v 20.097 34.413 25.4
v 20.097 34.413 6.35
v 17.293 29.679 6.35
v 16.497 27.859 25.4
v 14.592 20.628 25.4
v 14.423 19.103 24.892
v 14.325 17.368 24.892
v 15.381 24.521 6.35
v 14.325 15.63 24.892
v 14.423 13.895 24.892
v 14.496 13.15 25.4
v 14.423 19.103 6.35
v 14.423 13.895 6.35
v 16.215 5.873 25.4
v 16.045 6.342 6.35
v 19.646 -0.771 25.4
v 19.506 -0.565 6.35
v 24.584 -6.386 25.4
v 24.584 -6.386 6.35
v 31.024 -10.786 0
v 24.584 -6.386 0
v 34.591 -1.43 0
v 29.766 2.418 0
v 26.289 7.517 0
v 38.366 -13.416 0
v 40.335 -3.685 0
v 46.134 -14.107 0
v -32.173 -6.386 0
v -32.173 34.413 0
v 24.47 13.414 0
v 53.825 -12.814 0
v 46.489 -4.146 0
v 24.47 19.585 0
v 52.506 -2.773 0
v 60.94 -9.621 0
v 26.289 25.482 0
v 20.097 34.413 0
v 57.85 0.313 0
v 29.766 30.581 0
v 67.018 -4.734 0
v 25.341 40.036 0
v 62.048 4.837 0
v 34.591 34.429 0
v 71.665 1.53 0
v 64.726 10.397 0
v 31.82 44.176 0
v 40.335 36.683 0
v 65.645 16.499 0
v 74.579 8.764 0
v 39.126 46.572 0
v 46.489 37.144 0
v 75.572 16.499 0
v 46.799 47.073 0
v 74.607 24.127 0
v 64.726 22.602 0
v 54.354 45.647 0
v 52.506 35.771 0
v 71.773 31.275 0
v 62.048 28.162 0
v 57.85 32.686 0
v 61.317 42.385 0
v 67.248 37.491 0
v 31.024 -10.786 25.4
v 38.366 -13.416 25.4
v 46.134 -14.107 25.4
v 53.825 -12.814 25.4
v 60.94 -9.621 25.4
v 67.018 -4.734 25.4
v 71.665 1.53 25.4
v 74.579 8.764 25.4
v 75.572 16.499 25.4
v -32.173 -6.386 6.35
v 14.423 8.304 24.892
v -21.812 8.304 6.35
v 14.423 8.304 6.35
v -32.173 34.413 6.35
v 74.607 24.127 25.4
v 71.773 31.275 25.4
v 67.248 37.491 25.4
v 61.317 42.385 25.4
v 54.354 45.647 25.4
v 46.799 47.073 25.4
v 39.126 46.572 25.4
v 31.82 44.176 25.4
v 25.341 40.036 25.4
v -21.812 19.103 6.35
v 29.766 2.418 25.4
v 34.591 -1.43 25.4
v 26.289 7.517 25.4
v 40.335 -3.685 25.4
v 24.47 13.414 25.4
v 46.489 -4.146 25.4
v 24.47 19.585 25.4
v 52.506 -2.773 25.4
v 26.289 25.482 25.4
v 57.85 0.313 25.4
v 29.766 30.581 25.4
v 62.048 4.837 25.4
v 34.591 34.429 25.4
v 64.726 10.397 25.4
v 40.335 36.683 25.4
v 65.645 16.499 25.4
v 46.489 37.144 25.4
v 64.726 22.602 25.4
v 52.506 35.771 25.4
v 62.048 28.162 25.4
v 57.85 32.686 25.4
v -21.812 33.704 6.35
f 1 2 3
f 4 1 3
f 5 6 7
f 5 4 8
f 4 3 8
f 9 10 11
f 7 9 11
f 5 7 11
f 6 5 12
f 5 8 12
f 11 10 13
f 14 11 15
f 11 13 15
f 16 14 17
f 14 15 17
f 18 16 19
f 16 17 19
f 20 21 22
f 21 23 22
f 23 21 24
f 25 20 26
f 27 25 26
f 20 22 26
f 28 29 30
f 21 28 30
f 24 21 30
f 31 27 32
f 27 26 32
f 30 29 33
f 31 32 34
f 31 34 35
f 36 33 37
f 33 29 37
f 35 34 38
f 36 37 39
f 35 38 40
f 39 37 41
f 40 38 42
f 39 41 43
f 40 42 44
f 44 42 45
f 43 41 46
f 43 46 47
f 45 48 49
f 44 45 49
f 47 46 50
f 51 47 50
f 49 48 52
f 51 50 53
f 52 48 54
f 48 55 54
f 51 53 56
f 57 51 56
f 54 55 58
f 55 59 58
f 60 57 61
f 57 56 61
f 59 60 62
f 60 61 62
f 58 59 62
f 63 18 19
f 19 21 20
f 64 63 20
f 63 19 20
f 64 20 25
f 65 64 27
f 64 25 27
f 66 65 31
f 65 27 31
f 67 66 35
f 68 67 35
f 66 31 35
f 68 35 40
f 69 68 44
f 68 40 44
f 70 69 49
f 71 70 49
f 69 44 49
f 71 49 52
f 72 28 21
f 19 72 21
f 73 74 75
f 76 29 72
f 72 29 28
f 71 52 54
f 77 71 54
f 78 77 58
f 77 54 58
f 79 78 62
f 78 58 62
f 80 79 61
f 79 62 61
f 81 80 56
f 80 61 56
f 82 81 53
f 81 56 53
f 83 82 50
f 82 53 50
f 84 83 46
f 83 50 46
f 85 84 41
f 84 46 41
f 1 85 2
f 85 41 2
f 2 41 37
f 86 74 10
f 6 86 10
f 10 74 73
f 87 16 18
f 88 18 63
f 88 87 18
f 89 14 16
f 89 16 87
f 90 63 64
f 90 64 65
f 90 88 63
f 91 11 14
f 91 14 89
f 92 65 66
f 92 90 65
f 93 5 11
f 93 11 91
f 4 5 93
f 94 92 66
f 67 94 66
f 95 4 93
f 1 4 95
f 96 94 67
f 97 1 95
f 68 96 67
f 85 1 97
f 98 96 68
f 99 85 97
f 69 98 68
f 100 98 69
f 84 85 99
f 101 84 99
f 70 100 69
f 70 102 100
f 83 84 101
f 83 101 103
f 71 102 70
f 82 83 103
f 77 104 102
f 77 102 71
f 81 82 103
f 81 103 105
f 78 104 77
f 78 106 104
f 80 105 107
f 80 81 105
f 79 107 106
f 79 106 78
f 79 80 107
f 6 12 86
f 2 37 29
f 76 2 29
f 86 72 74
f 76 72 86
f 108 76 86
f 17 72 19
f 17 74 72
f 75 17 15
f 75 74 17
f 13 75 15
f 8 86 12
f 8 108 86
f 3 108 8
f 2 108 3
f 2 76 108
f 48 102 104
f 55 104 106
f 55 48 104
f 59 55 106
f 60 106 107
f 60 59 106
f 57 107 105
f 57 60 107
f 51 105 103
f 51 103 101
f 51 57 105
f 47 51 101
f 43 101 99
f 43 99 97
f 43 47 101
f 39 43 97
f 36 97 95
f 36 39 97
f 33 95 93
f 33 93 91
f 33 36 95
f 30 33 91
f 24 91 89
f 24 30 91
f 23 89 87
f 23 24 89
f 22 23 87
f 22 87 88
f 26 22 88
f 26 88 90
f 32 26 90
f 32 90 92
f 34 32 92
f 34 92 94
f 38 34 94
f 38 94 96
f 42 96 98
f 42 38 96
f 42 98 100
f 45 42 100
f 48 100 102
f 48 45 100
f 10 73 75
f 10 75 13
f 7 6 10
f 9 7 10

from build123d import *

# Parameters (mm, degrees)
F1_DEPTH = 6.35
F0_R     = 20.703057
F2_DEPTH = 25.4
F4_DEPTH = 18.542
F6_DEPTH = 25.4


with BuildPart() as f1:
    # F0 (on Top) → F1 (new body)
    with BuildSketch(Plane.XY):
        with BuildLine():
            ThreePointArc((24.584481, -6.386341), (14.495983, 13.150341), (20.096751, 34.412776))
            Line((20.096751, 34.412776), (-32.172695, 34.412776))
            Line((-32.172695, 34.412776), (-32.172695, -6.386341))
            Line((-32.172695, -6.386341), (24.584481, -6.386341))
        make_face()
    extrude(amount=F1_DEPTH)

    # F0 (on Top) → F2 (join)
    with BuildSketch(Plane.XY):
        with BuildLine():
            ThreePointArc((24.584481, -6.386341), (57.484915, -11.444852), (75.572235, 16.499306))
            ThreePointArc((75.572235, 16.499306), (54.354409, 45.647298), (20.096751, 34.412776))
            ThreePointArc((20.096751, 34.412776), (14.495983, 13.150341), (24.584481, -6.386341))
        make_face()
        with Locations((44.942293, 16.499306)):
            Circle(F0_R, mode=Mode.SUBTRACT)
    extrude(amount=F2_DEPTH)

    # F3 (on face) → F4 (join)
    with BuildSketch(Plane.XY.offset(6.35)):
        with BuildLine():
            ThreePointArc((14.423249, 13.89521), (14.312351, 16.499306), (14.423249, 19.103403))
            Line((14.423249, 19.103403), (-21.812018, 19.103403))
            Line((-21.812018, 19.103403), (-21.812018, 8.304046))
            Line((-21.812018, 8.304046), (14.423249, 8.304046))
            Line((14.423249, 8.304046), (14.423249, 13.89521))
        make_face()
    extrude(amount=F4_DEPTH)

    # F5 (on face) → F6 (cut)
    with BuildSketch(Plane.XZ.offset(-8.304046)):
        Polygon((-21.812018, 24.892), (-21.812018, 6.35), (14.423249, 24.892), align=None)
    extrude(amount=-F6_DEPTH, mode=Mode.SUBTRACT)


solid = f1.part
